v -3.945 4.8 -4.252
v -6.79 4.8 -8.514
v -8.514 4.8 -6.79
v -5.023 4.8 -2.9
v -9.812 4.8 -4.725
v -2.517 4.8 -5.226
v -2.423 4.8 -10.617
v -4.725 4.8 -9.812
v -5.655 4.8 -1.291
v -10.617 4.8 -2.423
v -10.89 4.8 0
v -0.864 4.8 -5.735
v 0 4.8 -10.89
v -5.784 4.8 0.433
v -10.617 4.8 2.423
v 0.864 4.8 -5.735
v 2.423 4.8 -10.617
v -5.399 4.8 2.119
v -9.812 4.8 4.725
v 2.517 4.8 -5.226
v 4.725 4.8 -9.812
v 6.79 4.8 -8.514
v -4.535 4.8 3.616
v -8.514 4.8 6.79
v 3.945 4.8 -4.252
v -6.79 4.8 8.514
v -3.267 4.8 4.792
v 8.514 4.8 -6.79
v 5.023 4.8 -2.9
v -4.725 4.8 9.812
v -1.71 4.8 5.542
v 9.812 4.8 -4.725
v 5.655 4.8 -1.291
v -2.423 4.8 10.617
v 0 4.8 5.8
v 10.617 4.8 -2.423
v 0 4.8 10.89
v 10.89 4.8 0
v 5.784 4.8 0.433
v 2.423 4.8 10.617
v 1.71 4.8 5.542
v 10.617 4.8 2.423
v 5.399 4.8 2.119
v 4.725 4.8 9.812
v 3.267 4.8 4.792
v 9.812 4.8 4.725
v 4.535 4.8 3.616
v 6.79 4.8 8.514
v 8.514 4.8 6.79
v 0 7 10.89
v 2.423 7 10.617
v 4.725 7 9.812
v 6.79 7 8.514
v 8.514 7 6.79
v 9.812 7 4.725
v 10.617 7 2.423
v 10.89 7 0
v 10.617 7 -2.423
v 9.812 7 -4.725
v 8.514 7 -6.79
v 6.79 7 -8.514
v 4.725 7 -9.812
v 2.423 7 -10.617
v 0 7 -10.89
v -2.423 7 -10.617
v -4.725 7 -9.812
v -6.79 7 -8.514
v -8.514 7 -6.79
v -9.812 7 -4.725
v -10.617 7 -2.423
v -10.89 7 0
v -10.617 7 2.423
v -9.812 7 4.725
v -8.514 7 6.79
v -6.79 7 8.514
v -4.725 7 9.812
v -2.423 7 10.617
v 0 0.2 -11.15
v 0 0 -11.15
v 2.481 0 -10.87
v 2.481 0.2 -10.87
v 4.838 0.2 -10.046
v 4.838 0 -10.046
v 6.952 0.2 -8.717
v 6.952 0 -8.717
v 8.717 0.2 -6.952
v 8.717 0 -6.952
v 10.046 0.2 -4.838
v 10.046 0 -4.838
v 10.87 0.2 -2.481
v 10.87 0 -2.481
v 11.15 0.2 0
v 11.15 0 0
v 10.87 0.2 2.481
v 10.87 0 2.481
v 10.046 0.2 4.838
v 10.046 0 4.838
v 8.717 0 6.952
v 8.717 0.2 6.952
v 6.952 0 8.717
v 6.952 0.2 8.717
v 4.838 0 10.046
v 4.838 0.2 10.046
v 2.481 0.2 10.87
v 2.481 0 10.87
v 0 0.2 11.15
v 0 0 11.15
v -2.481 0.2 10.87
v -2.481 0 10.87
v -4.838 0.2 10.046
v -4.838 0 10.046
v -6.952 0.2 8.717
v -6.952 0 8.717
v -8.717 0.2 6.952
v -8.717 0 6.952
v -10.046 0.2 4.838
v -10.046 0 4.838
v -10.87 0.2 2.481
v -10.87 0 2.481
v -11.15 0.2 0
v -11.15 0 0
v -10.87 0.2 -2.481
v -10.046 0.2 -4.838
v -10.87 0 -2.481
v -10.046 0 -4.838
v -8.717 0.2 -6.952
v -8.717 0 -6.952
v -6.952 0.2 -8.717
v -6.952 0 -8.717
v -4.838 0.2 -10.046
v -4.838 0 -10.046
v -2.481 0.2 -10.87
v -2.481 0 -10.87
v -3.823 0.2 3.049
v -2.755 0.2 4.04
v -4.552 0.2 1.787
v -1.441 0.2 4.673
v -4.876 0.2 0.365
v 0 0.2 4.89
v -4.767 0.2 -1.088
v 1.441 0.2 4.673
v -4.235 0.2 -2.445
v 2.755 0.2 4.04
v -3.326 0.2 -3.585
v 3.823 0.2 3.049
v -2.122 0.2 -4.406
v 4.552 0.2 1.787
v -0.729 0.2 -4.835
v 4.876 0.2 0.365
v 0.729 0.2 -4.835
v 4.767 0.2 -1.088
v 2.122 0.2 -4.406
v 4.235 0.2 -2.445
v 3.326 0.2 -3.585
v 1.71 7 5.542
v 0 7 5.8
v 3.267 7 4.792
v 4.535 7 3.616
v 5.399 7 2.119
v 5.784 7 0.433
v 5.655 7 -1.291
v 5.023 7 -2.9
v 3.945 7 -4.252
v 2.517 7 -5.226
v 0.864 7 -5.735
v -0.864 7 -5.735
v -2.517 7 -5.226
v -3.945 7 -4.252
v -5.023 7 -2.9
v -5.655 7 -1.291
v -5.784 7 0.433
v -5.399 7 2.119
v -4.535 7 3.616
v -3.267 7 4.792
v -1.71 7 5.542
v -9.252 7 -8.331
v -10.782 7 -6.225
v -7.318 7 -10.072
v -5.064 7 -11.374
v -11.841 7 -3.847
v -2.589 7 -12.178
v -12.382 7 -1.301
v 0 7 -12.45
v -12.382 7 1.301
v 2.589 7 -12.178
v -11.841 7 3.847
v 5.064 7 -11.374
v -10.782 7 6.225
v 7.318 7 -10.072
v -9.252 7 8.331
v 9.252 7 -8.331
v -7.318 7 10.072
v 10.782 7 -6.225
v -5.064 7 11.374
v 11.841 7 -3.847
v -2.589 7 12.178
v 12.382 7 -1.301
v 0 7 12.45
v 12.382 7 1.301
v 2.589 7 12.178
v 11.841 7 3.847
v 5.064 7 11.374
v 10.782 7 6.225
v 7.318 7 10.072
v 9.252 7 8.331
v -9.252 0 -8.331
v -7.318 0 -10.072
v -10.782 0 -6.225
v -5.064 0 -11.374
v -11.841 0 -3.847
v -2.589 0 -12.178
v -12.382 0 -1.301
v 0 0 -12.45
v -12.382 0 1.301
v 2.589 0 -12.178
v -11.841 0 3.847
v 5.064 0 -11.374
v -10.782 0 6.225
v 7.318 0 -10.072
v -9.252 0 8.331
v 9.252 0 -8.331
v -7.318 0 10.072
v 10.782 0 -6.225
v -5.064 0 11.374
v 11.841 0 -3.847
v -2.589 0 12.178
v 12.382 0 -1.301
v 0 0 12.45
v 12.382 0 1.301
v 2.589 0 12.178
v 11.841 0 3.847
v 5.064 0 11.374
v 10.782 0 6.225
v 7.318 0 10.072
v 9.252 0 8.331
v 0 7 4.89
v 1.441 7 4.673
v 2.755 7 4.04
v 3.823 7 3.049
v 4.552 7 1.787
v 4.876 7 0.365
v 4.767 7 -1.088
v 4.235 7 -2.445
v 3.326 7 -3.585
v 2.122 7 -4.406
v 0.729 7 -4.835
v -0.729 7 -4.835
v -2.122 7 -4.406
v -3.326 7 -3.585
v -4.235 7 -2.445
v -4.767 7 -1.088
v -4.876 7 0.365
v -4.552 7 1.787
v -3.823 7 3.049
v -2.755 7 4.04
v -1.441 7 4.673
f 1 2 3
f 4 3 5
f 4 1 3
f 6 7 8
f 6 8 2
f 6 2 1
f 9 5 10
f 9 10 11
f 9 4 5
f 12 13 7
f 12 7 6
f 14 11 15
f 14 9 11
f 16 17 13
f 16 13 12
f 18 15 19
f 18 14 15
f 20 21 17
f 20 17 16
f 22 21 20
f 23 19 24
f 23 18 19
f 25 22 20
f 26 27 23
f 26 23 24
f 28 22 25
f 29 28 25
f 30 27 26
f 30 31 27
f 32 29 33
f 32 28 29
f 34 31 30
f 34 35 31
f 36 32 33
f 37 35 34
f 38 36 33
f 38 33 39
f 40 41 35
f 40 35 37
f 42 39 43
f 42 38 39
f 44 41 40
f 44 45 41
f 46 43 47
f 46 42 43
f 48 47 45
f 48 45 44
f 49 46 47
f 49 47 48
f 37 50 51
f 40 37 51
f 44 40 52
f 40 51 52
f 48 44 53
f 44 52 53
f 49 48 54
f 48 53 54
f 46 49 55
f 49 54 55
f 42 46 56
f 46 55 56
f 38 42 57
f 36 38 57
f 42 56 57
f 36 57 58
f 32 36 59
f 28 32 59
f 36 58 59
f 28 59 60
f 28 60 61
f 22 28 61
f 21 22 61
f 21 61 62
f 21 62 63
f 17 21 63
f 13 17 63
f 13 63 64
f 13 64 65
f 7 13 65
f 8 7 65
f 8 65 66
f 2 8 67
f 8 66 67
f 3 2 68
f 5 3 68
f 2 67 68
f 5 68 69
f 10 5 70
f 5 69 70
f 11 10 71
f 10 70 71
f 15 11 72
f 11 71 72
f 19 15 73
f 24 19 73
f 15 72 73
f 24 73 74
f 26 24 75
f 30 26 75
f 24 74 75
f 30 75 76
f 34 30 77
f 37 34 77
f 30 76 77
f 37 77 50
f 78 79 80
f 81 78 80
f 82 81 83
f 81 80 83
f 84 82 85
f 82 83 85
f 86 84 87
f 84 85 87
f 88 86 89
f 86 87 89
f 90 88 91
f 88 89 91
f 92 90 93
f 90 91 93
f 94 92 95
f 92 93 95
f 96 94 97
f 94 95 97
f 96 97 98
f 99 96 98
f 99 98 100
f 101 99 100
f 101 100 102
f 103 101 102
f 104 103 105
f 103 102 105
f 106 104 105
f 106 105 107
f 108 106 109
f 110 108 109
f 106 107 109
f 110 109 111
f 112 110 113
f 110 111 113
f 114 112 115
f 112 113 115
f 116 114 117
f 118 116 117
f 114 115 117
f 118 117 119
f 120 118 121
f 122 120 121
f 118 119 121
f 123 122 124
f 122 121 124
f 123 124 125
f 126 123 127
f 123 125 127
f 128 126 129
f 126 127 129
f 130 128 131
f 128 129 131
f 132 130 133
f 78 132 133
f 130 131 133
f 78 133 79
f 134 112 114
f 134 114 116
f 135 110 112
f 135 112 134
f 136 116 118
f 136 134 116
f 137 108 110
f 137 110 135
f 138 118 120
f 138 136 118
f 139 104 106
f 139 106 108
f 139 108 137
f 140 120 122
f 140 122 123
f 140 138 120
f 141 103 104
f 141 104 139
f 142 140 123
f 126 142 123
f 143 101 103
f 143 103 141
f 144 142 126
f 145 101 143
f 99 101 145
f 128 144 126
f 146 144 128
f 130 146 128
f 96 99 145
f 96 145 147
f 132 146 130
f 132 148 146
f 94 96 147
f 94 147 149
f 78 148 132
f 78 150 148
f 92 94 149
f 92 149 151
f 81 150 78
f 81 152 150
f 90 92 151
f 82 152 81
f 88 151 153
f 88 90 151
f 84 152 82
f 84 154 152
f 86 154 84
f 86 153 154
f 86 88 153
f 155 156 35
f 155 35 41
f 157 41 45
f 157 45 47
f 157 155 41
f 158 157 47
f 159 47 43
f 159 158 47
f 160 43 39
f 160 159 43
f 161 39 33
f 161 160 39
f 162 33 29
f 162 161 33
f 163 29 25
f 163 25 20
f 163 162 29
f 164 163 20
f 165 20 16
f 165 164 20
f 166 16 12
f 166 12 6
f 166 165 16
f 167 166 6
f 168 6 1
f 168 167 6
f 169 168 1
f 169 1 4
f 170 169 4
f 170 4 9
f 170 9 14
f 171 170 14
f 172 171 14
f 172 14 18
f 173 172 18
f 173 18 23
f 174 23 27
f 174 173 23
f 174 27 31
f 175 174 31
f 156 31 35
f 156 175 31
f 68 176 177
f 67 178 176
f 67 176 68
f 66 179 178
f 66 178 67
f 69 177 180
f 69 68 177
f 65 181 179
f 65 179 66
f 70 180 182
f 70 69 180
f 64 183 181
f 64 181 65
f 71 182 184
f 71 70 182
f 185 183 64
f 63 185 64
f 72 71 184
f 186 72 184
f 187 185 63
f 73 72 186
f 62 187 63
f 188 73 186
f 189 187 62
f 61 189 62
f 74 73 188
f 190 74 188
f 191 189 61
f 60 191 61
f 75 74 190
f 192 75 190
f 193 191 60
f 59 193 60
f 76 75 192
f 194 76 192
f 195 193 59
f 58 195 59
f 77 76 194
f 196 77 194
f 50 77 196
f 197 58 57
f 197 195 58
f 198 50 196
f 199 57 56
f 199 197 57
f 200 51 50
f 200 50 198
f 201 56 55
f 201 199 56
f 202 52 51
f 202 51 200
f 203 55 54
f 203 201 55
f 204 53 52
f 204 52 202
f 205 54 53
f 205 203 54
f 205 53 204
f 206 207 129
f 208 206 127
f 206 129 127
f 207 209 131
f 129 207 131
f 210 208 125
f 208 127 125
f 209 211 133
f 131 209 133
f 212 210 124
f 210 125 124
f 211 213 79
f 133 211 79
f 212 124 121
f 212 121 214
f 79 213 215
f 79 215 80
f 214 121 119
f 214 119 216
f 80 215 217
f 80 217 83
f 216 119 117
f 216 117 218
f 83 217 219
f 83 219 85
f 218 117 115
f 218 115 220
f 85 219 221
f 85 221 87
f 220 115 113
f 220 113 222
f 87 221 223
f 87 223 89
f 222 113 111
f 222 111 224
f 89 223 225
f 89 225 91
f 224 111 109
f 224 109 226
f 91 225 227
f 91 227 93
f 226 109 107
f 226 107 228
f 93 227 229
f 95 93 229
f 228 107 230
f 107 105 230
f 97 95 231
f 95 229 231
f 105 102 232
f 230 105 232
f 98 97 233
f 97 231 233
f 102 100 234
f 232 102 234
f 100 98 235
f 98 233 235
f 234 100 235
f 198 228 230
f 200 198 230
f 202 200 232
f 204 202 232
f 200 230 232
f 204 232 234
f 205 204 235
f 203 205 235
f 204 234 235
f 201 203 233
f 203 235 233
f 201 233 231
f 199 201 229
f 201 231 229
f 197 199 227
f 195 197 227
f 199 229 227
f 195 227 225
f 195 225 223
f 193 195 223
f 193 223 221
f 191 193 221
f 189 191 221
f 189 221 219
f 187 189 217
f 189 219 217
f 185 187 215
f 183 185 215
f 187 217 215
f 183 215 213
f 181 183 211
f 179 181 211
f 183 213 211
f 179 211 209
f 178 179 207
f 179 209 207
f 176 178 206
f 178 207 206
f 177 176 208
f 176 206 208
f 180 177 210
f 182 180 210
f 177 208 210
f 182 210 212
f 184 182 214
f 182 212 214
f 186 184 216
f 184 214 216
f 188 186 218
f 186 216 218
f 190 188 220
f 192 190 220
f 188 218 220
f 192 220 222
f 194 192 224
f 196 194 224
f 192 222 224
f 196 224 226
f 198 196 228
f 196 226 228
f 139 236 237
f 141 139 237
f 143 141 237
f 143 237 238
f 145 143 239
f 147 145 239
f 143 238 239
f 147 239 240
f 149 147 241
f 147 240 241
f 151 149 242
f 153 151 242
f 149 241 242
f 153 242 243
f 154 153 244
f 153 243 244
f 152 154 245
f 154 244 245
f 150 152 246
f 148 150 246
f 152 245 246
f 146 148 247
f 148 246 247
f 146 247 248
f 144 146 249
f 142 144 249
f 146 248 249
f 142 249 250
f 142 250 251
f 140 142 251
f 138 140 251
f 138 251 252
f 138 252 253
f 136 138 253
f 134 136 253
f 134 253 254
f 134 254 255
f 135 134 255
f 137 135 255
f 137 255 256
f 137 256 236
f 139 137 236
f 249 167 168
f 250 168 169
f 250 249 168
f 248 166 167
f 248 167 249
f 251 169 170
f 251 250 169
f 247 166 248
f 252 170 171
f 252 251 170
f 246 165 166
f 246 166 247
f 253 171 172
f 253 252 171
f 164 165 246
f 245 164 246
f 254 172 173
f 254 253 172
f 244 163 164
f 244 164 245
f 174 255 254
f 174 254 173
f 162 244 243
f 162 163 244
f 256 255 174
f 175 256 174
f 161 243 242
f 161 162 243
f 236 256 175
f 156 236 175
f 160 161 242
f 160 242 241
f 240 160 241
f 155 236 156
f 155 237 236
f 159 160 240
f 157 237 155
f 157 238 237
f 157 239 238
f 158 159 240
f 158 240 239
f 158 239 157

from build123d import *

# Parameters (mm, degrees)
SKETCH1_R           = 12.45
BOSS_EXTRUDE1_DEPTH = 7
SKETCH2_R           = 4.89
CUT_EXTRUDE1_DEPTH  = 19.947427266
SKETCH3_R           = 10.89
SKETCH3_R_2         = 5.8
CUT_EXTRUDE2_DEPTH  = 2.2
SKETCH4_R           = 11.15
CUT_EXTRUDE3_DEPTH  = 0.2


with BuildPart() as part:
    # Sketch1 → Boss-Extrude1 (new body)
    with BuildSketch(Plane(origin=(0, 0, 0), x_dir=(1, 0, 0), z_dir=(0, 1, 0))):
        with Locations(Location((0, 0, 0), (0, 0, 270))):
            Circle(SKETCH1_R)
    extrude(amount=BOSS_EXTRUDE1_DEPTH)

    # Sketch2 → Cut-Extrude1 (cut, through all)
    with BuildSketch(Plane(origin=(0, 7, 0), x_dir=(1, 0, 0), z_dir=(0, 1, 0))):
        with Locations(Location((0, 0, 0), (0, 0, 270))):
            Circle(SKETCH2_R)
    extrude(amount=-CUT_EXTRUDE1_DEPTH, mode=Mode.SUBTRACT)

    # Sketch3 → Cut-Extrude2 (cut)
    with BuildSketch(Plane(origin=(0, 7, 0), x_dir=(1, 0, 0), z_dir=(0, 1, 0))):
        with Locations(Location((0, 0, 0), (0, 0, 270))):
            Circle(SKETCH3_R)
        with Locations(Location((0, 0, 0), (0, 0, 270))):
            Circle(SKETCH3_R_2, mode=Mode.SUBTRACT)
    extrude(amount=-CUT_EXTRUDE2_DEPTH, mode=Mode.SUBTRACT)

    # Sketch4 → Cut-Extrude3 (cut)
    with BuildSketch(Plane.XZ):
        with Locations(Location((0, 0, 0), (0, 0, 270))):
            Circle(SKETCH4_R)
    extrude(amount=-CUT_EXTRUDE3_DEPTH, mode=Mode.SUBTRACT)


solid = part.part
